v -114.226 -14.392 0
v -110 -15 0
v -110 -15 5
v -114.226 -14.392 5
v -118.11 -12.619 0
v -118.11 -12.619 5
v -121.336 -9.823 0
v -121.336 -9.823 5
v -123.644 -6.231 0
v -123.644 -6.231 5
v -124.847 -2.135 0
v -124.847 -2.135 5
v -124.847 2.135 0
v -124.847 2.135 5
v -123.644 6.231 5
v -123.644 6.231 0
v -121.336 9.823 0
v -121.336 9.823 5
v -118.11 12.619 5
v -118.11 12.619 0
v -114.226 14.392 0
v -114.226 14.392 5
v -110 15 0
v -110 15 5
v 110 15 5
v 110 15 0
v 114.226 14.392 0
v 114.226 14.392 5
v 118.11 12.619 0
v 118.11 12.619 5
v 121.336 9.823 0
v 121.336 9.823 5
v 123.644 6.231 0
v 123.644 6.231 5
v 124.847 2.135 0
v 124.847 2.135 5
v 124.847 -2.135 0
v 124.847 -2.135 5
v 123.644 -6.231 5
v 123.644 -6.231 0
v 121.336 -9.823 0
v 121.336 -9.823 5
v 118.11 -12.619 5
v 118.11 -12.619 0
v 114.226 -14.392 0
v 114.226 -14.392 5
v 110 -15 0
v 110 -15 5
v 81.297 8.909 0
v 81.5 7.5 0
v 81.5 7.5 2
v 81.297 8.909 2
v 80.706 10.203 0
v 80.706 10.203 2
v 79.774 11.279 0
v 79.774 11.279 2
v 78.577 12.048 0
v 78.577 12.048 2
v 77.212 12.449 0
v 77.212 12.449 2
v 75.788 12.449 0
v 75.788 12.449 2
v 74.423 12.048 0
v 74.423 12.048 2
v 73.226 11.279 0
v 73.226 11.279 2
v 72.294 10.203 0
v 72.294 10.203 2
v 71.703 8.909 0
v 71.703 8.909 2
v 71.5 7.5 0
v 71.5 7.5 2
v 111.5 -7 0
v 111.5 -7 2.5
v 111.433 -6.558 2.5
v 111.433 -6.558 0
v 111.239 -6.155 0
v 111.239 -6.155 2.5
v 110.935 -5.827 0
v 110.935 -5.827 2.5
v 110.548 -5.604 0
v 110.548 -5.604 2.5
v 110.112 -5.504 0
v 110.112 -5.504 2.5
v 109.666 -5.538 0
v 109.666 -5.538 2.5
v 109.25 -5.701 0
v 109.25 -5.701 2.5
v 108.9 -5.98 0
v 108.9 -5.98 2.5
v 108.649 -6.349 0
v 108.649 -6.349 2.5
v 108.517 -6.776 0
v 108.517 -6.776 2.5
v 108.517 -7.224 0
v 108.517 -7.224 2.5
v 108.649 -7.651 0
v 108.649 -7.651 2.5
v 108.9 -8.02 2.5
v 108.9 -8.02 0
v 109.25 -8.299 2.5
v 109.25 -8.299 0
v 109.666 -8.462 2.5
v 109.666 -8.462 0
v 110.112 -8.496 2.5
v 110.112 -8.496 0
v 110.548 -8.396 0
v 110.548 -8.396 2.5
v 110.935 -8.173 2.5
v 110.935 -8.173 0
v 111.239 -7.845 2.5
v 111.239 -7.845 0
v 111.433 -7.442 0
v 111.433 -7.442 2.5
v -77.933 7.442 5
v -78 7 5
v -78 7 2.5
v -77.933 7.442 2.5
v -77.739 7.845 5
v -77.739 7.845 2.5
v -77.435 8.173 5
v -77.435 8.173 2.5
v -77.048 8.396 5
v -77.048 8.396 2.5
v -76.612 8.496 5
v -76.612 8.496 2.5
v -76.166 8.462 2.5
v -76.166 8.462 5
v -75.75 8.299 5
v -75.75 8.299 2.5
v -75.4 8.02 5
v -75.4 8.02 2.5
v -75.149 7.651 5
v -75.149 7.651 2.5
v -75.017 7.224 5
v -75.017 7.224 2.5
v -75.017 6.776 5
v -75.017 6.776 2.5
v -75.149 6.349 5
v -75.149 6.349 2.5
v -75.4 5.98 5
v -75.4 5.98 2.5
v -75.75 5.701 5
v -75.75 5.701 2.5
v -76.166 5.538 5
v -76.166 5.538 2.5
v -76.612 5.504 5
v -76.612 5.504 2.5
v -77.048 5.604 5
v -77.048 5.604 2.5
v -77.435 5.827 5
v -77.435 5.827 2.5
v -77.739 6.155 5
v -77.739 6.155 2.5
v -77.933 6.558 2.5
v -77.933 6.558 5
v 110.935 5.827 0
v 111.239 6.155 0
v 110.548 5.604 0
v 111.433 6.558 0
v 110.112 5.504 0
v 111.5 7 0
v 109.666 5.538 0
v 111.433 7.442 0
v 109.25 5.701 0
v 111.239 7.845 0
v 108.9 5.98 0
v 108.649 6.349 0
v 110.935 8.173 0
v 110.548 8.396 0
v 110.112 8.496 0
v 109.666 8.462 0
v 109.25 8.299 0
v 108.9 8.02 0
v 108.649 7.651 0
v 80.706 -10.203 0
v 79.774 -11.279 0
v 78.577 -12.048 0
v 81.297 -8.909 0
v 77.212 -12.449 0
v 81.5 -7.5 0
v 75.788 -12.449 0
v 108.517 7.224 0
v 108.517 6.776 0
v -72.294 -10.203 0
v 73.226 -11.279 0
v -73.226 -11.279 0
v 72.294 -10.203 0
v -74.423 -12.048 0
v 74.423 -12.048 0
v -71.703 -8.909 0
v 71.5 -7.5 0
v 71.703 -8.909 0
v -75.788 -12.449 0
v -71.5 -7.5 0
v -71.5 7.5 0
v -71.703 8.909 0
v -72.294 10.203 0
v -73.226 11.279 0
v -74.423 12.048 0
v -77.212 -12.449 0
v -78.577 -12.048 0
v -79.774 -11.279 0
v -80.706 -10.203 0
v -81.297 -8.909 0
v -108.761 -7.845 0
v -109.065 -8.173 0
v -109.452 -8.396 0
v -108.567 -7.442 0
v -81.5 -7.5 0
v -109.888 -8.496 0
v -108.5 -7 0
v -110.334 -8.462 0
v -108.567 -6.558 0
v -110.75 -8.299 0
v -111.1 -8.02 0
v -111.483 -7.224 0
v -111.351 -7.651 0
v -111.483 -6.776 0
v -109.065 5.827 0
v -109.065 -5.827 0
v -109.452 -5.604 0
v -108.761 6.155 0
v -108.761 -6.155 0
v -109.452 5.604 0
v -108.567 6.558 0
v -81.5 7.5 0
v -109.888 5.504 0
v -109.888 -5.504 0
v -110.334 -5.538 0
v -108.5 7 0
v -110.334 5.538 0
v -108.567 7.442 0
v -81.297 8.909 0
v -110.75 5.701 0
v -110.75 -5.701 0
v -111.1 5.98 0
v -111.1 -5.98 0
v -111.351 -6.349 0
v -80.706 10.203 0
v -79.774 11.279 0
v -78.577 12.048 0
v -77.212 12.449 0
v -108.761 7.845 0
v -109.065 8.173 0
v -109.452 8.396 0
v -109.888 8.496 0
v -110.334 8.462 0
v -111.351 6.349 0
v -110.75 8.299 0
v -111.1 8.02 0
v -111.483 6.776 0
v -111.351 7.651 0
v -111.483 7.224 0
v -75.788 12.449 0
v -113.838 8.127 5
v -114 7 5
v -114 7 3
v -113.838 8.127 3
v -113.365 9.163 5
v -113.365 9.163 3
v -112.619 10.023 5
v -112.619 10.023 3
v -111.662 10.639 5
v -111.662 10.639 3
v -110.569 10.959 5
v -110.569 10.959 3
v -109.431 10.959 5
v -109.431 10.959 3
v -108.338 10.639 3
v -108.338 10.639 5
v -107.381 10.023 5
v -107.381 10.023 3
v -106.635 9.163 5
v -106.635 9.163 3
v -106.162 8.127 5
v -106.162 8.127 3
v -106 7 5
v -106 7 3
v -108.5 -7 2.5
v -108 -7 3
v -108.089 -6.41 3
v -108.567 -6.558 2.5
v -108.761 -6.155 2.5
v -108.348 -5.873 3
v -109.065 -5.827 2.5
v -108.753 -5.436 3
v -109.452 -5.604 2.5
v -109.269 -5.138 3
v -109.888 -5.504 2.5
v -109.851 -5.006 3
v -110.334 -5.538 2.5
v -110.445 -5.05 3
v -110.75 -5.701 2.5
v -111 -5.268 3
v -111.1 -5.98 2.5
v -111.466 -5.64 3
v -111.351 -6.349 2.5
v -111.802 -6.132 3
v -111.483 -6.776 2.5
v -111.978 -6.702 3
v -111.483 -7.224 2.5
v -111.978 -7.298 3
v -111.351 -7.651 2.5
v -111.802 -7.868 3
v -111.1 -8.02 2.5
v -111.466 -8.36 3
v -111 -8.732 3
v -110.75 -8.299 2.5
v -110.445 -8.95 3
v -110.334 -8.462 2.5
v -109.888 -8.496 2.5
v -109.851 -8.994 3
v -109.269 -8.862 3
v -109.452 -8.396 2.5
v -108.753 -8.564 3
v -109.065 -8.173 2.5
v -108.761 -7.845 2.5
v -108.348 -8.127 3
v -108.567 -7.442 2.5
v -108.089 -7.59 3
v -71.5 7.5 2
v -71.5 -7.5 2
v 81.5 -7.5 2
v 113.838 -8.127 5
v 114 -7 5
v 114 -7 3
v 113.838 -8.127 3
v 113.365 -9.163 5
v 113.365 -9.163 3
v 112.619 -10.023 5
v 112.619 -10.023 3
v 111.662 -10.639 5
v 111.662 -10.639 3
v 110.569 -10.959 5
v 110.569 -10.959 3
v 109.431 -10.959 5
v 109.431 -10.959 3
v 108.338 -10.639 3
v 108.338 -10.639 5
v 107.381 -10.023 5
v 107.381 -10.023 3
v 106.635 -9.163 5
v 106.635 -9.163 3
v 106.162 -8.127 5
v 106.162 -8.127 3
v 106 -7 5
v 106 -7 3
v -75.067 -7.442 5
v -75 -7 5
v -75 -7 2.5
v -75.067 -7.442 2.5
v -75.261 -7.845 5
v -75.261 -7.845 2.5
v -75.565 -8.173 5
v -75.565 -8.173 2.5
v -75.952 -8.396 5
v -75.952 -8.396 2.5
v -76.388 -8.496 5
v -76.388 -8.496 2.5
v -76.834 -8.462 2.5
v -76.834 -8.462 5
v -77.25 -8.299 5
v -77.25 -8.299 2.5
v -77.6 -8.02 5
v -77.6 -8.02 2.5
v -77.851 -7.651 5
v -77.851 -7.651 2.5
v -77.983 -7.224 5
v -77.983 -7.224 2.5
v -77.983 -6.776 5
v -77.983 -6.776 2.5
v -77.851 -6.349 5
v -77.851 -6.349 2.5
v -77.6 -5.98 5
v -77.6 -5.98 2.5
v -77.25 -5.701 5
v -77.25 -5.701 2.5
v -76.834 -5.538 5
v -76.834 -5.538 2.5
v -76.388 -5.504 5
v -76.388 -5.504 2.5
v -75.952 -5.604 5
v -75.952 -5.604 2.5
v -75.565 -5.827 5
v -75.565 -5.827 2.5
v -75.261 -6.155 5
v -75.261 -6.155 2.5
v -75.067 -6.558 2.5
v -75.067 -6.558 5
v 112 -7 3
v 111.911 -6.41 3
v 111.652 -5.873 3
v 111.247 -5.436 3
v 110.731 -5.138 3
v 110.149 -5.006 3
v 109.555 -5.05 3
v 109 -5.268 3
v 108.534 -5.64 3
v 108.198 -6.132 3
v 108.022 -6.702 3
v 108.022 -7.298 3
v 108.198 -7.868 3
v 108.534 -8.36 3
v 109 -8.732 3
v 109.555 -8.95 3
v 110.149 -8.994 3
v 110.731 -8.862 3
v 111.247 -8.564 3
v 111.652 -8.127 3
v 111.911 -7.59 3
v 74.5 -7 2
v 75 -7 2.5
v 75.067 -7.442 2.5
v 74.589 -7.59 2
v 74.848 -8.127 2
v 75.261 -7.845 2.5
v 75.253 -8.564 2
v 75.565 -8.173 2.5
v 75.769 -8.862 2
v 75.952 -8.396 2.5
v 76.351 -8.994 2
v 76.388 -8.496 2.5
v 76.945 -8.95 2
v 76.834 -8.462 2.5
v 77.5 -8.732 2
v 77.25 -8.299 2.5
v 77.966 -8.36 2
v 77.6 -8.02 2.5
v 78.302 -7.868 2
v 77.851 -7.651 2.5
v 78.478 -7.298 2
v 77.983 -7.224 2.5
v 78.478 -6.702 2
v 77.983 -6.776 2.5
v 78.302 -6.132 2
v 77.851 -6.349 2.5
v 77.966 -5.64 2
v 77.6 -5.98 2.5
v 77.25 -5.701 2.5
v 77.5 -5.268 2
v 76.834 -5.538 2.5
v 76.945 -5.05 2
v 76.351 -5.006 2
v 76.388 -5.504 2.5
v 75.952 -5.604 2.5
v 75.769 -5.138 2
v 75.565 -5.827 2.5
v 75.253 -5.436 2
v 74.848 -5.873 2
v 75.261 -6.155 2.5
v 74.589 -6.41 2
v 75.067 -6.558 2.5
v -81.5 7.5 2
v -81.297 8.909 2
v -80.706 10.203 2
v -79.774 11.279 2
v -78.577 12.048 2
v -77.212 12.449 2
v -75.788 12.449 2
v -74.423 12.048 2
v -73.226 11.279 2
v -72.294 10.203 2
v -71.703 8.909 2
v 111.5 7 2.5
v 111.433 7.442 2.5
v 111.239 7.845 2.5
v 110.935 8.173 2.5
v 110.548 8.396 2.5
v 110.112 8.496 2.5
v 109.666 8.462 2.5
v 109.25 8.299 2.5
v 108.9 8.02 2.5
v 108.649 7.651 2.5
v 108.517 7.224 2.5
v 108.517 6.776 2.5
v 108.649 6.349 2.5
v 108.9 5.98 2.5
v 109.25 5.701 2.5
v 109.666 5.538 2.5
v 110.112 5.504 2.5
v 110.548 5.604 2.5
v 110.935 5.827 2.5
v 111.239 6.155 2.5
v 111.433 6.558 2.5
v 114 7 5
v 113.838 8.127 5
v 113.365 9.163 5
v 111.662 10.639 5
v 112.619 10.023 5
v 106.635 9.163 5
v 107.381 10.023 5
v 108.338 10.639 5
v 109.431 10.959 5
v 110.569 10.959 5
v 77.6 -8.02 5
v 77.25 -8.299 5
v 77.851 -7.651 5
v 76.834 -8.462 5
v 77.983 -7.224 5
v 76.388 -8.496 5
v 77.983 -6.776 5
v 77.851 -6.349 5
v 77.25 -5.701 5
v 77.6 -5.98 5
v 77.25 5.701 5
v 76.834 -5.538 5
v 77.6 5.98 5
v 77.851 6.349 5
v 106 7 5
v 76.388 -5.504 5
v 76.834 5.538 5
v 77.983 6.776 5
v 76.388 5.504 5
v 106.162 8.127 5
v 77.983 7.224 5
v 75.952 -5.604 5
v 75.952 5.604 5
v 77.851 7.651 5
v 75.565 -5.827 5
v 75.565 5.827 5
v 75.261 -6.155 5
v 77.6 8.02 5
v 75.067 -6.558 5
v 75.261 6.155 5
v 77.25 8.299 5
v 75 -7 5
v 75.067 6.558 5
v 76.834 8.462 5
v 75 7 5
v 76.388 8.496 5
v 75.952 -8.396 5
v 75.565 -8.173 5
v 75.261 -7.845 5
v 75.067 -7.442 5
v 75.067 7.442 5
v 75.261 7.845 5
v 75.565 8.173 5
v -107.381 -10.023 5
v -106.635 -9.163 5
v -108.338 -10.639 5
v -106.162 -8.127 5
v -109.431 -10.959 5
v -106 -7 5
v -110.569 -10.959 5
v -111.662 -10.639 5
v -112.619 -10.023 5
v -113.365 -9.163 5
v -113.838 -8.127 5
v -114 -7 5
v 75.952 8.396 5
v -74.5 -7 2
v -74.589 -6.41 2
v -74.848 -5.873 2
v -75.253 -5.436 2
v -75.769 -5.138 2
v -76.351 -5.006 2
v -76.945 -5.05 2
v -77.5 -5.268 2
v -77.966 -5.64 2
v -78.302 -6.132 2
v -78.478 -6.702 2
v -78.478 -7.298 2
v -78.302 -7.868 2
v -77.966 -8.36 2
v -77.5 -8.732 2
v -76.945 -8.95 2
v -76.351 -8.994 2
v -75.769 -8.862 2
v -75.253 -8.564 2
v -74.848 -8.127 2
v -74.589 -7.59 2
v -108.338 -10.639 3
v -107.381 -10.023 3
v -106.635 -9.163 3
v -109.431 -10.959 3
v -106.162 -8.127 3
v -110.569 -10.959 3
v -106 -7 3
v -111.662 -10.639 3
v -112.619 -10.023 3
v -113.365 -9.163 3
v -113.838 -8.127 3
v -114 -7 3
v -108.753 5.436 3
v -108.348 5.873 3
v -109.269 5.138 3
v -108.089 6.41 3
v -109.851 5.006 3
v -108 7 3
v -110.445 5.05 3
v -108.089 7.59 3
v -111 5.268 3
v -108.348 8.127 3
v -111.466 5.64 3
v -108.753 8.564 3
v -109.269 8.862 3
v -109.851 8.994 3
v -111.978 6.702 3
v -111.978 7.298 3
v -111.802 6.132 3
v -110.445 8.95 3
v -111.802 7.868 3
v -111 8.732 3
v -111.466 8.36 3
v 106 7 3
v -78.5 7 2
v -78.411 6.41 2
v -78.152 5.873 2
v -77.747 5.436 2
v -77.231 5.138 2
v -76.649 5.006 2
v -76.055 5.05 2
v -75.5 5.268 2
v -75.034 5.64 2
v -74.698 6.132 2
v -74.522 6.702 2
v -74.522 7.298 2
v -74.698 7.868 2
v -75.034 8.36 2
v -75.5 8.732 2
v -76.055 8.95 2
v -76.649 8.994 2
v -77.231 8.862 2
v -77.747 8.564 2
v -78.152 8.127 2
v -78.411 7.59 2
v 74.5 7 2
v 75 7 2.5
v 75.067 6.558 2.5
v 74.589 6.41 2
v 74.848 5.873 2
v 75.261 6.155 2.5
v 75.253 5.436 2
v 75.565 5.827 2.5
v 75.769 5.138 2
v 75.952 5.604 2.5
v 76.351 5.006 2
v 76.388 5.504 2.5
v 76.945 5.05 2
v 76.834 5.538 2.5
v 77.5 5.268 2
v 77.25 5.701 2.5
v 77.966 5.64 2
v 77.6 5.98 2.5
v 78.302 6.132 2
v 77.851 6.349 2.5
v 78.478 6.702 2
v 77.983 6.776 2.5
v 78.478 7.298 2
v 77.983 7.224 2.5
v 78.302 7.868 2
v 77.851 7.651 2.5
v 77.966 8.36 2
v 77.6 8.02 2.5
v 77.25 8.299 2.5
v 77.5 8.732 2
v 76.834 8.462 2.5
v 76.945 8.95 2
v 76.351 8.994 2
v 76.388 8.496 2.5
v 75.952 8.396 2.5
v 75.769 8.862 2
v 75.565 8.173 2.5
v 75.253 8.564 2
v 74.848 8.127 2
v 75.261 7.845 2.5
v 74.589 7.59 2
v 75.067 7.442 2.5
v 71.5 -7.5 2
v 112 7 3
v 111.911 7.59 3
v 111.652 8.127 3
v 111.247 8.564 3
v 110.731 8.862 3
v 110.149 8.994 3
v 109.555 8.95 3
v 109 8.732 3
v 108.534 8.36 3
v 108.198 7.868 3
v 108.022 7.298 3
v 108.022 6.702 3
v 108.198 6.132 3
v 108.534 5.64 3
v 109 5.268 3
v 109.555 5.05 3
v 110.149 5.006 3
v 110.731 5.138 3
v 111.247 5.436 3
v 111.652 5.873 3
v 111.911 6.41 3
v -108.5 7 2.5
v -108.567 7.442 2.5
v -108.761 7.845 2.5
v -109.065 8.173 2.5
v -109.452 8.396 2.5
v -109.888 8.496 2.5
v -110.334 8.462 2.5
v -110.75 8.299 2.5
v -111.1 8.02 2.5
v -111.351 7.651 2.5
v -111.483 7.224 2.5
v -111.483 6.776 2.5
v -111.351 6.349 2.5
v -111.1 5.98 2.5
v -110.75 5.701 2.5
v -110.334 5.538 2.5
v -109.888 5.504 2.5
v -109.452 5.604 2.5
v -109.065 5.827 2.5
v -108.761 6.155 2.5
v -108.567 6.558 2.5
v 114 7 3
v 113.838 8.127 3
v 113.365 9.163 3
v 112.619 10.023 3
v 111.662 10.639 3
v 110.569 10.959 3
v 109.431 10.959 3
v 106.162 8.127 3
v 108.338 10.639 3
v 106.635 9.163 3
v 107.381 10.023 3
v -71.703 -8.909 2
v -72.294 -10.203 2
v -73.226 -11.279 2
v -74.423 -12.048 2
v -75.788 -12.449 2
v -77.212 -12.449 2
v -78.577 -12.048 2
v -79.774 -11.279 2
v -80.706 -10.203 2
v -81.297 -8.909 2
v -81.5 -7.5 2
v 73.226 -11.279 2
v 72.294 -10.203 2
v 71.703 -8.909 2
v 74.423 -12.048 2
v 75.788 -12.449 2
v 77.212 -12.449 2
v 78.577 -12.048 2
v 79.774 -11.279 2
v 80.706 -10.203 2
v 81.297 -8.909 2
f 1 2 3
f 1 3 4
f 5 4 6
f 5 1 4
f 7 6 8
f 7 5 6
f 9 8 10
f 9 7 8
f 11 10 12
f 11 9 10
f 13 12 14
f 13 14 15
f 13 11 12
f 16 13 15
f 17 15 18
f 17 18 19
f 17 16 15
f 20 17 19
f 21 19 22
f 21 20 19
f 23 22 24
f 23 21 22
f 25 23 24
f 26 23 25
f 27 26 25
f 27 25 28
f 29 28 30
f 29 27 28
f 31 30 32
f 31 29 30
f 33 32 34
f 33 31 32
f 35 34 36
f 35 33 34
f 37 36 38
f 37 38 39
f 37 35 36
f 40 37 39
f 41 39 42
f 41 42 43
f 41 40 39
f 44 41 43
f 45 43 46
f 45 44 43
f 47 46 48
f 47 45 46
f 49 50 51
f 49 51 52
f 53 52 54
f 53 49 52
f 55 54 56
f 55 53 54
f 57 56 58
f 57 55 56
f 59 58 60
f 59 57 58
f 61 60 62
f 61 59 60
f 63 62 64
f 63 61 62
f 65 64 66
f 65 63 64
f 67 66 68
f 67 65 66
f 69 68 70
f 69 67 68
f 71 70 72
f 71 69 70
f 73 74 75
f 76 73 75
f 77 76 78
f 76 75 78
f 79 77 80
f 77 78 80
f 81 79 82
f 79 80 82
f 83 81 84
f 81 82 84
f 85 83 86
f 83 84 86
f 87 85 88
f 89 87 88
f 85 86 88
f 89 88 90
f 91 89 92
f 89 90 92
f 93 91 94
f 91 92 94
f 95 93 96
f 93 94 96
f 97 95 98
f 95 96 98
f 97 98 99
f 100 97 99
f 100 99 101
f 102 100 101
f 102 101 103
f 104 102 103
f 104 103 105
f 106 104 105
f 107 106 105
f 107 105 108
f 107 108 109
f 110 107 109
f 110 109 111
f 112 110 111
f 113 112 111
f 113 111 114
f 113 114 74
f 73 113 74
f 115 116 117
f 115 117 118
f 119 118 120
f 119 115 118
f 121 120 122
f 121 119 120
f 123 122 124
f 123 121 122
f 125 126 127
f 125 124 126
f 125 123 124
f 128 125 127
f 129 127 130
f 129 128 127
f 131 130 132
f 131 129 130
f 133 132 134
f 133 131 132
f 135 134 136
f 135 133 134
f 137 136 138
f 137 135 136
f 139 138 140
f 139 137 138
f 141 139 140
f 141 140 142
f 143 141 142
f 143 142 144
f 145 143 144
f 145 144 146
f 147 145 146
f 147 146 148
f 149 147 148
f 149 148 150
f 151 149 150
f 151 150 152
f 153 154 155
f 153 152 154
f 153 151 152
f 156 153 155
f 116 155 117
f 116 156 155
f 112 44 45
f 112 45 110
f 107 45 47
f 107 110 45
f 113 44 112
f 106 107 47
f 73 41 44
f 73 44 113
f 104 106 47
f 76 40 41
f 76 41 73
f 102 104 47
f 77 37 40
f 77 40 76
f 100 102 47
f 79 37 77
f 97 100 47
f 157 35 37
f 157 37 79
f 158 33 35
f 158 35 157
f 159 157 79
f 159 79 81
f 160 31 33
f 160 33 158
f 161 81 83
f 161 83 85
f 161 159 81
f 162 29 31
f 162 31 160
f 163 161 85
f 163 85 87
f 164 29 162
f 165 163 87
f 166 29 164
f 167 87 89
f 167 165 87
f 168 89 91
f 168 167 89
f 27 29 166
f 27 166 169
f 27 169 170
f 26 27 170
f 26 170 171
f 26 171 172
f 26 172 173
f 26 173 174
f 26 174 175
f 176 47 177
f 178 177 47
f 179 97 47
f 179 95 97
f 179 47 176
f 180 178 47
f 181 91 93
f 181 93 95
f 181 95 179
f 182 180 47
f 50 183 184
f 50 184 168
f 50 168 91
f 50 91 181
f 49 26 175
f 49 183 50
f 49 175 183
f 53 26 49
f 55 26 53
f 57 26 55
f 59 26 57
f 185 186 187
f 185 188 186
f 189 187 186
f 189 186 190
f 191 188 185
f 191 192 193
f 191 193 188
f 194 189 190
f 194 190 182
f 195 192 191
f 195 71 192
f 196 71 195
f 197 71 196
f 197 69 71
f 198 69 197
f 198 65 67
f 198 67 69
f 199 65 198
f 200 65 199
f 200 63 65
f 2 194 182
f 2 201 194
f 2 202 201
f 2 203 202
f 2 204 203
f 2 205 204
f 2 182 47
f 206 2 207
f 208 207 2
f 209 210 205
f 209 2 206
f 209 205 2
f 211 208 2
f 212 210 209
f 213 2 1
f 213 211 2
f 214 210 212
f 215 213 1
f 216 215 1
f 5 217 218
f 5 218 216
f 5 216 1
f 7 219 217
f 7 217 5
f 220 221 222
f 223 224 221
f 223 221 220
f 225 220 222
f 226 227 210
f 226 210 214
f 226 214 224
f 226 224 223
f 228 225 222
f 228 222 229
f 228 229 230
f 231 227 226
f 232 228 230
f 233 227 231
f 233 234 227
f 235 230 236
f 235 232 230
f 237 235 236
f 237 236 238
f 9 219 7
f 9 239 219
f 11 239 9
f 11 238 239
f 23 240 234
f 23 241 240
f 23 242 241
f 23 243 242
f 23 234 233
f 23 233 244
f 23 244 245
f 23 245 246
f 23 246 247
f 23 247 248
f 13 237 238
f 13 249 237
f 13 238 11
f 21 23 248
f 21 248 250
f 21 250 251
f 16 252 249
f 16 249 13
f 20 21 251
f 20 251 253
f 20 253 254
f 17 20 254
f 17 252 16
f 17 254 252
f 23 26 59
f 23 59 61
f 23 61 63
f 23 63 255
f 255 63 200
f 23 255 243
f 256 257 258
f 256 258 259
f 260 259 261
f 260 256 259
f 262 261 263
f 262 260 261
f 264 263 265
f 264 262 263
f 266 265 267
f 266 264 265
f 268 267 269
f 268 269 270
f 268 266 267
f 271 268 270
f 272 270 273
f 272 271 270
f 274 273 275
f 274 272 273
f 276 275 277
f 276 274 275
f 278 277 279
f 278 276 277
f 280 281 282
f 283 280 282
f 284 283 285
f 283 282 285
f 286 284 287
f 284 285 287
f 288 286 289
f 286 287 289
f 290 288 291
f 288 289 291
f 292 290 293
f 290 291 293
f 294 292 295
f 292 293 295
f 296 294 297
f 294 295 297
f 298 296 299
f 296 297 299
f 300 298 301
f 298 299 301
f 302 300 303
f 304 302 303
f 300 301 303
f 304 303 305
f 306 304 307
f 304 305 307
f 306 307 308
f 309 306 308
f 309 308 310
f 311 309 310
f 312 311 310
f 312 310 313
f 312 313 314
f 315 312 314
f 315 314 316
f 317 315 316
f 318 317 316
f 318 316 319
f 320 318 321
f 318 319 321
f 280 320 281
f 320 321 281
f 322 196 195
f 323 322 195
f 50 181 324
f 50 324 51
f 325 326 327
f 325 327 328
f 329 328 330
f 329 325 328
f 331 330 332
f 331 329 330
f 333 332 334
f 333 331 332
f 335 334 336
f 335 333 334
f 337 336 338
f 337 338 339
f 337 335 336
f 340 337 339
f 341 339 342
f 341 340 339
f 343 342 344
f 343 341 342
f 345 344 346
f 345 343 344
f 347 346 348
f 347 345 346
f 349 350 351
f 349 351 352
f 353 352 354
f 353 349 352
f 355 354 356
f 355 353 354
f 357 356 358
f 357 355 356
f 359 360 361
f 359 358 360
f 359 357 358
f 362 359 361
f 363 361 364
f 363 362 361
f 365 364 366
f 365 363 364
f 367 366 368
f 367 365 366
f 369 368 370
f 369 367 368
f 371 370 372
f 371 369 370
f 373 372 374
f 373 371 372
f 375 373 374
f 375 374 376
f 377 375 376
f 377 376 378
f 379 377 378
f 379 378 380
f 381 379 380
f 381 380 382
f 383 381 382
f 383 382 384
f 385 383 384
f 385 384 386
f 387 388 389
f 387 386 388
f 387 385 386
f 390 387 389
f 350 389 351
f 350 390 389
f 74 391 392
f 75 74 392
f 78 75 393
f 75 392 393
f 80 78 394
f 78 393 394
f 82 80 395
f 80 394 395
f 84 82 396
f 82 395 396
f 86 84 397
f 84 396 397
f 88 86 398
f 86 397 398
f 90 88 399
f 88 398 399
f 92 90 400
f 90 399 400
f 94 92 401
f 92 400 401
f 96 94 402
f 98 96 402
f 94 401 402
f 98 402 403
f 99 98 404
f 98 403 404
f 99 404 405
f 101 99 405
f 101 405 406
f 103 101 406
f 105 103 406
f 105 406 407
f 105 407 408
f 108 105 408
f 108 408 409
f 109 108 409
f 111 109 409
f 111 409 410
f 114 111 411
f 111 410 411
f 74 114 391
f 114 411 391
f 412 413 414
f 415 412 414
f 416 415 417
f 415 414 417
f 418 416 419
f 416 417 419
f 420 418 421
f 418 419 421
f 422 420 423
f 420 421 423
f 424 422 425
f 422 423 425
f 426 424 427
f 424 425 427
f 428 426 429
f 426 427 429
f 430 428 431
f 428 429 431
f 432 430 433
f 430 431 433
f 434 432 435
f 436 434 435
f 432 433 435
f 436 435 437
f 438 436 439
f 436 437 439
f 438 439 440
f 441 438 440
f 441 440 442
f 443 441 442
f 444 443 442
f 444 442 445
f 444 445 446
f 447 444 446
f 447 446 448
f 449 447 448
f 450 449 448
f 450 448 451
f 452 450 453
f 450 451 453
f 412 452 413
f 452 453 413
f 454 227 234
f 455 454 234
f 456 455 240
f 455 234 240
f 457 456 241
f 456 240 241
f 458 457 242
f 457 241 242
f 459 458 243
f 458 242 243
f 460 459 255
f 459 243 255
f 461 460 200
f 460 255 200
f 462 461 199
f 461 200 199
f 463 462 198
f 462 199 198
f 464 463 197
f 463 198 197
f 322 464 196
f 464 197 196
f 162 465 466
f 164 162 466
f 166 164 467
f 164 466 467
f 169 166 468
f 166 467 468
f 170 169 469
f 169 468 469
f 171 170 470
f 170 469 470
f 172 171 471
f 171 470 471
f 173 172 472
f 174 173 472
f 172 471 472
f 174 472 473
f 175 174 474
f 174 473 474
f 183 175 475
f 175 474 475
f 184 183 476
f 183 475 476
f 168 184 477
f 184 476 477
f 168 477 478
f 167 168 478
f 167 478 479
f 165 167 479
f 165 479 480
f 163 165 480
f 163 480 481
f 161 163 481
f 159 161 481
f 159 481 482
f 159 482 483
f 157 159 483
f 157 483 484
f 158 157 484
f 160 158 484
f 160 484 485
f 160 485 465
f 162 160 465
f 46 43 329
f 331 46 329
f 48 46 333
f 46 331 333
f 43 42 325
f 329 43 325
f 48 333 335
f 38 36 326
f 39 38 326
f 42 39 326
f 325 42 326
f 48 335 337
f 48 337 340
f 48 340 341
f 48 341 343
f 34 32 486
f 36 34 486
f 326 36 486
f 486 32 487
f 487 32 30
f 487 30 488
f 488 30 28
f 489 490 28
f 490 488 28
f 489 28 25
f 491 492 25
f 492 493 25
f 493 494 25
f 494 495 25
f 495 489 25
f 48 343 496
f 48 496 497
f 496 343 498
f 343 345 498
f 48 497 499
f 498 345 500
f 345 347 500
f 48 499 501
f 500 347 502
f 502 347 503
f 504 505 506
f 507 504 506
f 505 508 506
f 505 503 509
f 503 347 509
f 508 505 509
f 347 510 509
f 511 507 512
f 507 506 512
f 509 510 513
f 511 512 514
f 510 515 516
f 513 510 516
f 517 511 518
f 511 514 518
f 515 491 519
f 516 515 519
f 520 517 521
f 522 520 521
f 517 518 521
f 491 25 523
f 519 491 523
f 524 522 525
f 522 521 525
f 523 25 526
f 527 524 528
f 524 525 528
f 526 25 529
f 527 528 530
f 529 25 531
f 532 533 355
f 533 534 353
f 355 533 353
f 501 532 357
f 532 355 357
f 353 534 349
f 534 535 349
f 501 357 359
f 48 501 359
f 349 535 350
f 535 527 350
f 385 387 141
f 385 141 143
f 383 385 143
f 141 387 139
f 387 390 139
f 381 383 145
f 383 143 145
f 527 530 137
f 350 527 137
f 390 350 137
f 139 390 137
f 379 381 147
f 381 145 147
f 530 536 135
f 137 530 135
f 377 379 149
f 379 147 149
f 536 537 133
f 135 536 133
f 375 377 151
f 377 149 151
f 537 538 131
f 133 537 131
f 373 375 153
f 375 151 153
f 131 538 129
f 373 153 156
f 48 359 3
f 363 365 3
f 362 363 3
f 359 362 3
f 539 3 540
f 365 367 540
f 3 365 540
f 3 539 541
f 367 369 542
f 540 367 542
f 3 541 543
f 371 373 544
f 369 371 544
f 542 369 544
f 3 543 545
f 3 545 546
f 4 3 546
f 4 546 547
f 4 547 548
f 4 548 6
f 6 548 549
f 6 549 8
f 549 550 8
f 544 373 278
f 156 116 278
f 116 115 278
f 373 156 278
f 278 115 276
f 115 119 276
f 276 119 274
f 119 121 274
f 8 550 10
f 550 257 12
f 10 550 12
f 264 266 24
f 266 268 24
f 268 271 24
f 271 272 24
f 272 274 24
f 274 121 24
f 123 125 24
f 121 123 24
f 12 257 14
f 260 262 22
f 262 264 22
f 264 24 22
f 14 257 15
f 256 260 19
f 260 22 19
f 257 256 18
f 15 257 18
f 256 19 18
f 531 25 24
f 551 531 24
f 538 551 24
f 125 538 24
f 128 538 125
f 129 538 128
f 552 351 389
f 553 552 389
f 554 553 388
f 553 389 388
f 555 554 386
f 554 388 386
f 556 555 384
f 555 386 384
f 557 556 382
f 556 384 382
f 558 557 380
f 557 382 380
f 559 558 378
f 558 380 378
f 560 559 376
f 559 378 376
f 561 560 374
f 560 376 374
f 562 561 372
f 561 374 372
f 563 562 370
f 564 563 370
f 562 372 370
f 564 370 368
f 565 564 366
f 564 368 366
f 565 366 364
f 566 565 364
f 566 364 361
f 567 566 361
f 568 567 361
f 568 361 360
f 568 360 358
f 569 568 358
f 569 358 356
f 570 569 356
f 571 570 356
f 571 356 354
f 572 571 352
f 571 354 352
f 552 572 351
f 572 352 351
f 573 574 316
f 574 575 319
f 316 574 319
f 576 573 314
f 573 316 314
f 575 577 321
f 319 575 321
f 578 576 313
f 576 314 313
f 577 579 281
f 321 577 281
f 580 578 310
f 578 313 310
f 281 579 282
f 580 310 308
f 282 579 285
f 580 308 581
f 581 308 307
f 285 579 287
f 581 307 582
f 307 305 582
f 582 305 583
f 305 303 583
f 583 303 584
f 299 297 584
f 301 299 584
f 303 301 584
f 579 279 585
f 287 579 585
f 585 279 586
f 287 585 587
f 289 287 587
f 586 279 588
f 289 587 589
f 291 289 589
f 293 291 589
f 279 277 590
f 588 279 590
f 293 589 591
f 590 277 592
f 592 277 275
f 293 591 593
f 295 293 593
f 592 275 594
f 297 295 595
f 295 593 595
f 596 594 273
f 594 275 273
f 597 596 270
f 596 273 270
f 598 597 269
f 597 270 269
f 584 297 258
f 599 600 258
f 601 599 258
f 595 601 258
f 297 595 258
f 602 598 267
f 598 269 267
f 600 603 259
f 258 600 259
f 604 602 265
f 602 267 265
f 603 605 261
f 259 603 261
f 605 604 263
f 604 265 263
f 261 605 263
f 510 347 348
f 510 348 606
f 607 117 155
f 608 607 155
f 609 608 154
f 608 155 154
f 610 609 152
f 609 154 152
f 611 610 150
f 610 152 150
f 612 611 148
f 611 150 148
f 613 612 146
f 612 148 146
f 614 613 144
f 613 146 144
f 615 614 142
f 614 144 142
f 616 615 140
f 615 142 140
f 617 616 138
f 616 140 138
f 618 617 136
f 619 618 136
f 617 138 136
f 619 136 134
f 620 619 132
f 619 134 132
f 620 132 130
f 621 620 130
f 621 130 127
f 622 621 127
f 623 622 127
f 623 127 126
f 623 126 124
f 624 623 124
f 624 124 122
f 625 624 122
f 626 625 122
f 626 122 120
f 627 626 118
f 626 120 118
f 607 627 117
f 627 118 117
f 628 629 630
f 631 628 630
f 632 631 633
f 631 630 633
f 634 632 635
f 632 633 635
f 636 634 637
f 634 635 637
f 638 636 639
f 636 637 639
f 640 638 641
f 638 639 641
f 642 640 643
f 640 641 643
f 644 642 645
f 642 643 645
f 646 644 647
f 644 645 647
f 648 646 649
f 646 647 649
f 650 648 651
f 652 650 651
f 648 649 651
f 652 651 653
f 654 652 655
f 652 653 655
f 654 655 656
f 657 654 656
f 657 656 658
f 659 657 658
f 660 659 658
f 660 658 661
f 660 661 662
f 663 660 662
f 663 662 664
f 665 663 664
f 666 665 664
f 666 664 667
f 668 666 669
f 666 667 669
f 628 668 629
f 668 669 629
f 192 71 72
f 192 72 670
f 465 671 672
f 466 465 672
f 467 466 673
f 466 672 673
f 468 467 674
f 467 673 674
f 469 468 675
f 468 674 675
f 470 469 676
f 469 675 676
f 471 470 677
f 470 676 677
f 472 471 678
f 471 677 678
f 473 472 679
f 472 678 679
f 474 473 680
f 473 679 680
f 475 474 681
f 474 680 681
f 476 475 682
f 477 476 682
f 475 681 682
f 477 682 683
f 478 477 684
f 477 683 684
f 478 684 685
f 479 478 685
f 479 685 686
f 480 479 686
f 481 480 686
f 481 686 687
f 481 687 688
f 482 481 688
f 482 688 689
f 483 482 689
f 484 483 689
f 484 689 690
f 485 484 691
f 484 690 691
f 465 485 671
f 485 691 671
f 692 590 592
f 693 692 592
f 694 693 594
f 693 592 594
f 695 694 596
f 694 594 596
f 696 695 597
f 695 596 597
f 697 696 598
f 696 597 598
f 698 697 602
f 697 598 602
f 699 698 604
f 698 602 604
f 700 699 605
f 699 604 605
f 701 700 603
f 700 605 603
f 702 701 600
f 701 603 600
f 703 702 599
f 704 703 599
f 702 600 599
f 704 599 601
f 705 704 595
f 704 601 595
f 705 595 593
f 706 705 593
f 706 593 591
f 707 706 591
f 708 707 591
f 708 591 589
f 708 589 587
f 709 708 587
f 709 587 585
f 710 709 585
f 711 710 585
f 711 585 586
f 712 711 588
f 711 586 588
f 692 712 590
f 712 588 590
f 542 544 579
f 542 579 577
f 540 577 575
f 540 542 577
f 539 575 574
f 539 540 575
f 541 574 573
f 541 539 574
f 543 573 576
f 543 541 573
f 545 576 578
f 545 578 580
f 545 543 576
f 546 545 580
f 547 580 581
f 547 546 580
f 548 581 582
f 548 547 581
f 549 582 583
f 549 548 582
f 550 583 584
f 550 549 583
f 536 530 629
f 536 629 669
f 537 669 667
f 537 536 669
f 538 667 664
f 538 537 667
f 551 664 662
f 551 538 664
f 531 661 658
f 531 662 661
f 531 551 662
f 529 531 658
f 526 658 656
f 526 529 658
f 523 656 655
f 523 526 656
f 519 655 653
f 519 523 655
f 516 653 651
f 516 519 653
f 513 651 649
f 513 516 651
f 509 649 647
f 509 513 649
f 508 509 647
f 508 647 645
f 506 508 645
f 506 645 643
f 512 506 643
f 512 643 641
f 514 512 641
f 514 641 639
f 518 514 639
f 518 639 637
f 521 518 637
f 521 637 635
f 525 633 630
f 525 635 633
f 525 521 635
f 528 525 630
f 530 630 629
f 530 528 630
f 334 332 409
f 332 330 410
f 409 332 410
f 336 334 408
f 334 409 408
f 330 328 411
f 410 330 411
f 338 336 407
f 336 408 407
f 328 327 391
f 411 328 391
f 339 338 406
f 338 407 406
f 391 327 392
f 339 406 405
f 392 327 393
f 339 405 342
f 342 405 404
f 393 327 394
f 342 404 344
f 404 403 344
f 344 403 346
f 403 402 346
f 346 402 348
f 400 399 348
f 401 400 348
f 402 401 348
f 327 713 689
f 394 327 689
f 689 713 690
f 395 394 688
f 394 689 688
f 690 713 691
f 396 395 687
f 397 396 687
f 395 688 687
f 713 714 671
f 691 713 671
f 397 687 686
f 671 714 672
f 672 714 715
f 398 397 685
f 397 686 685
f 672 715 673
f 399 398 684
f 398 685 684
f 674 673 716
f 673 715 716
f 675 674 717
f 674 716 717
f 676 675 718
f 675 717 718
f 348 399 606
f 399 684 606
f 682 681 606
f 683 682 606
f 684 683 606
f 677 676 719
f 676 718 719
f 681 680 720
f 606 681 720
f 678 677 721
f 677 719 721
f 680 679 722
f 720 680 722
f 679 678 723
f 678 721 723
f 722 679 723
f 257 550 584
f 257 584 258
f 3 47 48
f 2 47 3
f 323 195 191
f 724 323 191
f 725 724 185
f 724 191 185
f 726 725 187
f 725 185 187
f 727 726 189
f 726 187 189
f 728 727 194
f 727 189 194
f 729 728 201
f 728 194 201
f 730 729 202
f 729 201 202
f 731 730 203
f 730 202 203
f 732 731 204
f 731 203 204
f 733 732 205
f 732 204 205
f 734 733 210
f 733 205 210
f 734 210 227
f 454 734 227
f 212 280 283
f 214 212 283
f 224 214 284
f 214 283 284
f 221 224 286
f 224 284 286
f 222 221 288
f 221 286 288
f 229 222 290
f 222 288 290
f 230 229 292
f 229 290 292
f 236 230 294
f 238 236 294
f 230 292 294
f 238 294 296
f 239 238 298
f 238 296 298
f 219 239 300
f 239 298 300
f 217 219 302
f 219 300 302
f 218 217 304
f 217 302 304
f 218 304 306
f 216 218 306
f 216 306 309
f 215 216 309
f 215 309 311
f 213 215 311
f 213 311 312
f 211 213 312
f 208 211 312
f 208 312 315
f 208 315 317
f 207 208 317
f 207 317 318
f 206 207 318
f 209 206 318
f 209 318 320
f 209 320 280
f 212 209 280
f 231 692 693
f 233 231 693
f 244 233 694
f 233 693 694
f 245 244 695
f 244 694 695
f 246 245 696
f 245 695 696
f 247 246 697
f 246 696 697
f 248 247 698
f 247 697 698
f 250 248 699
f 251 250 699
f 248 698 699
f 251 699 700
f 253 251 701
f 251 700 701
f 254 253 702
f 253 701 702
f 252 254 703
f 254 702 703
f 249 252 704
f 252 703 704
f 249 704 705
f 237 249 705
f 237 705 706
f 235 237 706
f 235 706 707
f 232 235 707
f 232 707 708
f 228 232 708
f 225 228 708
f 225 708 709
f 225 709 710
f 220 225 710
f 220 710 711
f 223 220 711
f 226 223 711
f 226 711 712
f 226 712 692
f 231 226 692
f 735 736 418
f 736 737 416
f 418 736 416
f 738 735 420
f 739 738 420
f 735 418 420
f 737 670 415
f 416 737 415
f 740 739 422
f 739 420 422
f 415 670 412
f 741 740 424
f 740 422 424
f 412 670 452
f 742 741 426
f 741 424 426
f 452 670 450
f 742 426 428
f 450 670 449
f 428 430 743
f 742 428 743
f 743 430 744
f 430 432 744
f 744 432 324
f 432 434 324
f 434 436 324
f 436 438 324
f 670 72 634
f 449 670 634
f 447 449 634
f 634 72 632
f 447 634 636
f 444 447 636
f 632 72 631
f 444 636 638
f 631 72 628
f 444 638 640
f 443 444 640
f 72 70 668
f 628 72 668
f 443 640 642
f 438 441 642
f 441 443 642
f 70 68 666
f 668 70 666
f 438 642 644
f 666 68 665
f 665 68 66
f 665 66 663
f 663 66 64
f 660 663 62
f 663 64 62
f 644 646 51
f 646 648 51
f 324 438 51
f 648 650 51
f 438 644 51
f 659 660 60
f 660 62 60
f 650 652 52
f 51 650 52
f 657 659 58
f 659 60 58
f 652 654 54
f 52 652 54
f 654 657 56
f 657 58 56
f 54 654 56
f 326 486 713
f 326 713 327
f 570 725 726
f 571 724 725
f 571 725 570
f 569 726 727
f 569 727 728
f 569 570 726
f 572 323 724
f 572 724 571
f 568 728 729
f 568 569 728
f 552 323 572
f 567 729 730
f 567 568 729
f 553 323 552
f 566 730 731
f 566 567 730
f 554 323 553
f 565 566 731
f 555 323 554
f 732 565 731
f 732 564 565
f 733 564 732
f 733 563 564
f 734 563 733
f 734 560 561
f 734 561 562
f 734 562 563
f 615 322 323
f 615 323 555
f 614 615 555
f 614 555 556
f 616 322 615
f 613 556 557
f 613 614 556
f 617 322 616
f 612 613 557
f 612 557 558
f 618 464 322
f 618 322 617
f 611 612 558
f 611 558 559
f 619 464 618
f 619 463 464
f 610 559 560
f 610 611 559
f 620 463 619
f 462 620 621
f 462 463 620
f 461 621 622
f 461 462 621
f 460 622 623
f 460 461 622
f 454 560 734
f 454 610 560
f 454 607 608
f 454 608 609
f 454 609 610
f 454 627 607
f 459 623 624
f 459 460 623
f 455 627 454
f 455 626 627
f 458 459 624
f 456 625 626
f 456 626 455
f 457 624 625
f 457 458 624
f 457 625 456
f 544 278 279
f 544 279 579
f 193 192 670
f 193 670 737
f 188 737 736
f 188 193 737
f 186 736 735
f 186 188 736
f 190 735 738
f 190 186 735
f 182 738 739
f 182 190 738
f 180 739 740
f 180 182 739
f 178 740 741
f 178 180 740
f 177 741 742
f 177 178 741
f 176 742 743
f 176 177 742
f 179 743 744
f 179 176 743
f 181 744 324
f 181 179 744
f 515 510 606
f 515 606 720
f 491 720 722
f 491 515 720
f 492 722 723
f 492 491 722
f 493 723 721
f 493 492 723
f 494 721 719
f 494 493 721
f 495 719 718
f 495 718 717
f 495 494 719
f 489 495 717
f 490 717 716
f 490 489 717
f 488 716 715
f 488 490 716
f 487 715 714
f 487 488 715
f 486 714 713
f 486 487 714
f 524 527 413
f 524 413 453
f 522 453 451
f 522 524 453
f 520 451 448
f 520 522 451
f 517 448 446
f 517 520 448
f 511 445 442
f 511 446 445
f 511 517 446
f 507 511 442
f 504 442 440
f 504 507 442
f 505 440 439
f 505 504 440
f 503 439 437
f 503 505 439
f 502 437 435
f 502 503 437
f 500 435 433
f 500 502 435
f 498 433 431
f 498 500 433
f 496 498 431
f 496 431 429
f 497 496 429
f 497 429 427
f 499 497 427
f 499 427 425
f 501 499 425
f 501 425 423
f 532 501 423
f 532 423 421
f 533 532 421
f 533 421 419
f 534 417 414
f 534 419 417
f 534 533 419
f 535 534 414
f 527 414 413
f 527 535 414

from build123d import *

# Parameters (mm, degrees)
EXTRUDE_1_DEPTH          = 5
CUT_EXTRUDE_1_DEPTH      = 2
CUT_EXTRUDE_2_DEPTH      = 2
CUT_EXTRUDE_4_DEPTH      = 126.932521614
CUT_EXTRUDE_4_DEPTH_BACK = 126.932521614
SKETCH_6_R               = 1.5
SKETCH_7_R               = 1.5
CUT_EXTRUDE_5_DEPTH      = 126.932521614
CHAMFER_1_SIZE           = 0.5
CHAMFER_2_SIZE           = 0.5


with BuildPart() as part:
    # 草图1 → 凸台-拉伸1 (new body)
    with BuildSketch(Plane.XY):
        with BuildLine():
            Line((-110, 15), (110, 15))
            ThreePointArc((110, 15), (125, 0), (110, -15))
            Line((110, -15), (-110, -15))
            ThreePointArc((-110, -15), (-125, 0), (-110, 15))
        make_face()
    extrude(amount=EXTRUDE_1_DEPTH)

    # 草图2 → 切除-拉伸1 (cut)
    with BuildSketch(Plane.XY.offset(5)):
        with BuildLine():
            Line((114, 7), (114, -7))
            ThreePointArc((114, -7), (110, -11), (106, -7))
            Line((106, -7), (106, 7))
            ThreePointArc((106, 7), (110, 11), (114, 7))
        make_face()
        with BuildLine():
            Line((-106, 7), (-106, -7))
            ThreePointArc((-106, -7), (-110, -11), (-114, -7))
            Line((-114, -7), (-114, 7))
            ThreePointArc((-114, 7), (-110, 11), (-106, 7))
        make_face()
    extrude(amount=-CUT_EXTRUDE_1_DEPTH, mode=Mode.SUBTRACT)

    # 草图4 → 切除-拉伸2 (cut)
    with BuildSketch(Plane(origin=(0, 0, 0), x_dir=(-1, 0, 0), z_dir=(0, 0, -1))):
        with BuildLine():
            Line((-71.5, 7.5), (-71.5, -7.5))
            ThreePointArc((-71.5, -7.5), (-76.5, -12.5), (-81.5, -7.5))
            Line((-81.5, -7.5), (-81.5, 7.5))
            ThreePointArc((-81.5, 7.5), (-76.5, 12.5), (-71.5, 7.5))
        make_face()
        with BuildLine():
            Line((71.5, 7.5), (71.5, -7.5))
            ThreePointArc((71.5, -7.5), (76.5, -12.5), (81.5, -7.5))
            Line((81.5, -7.5), (81.5, 7.5))
            ThreePointArc((81.5, 7.5), (76.5, 12.5), (71.5, 7.5))
        make_face()
    extrude(amount=-CUT_EXTRUDE_2_DEPTH, mode=Mode.SUBTRACT)

    # 草图6 → 切除-拉伸4 (cut, two sides: drawn at the far end of the back side and taken through both)
    with BuildSketch(Plane(origin=(0, 0, 2), x_dir=(-1, 0, 0), z_dir=(0, 0, -1)).offset(-CUT_EXTRUDE_4_DEPTH_BACK)):
        with Locations((76.5, 7)):
            Circle(SKETCH_6_R)
        with Locations(Location((76.5, -7, 0), (0, 0, 180))):
            Circle(SKETCH_6_R)
        with Locations((-76.5, 7)):
            Circle(SKETCH_6_R)
        with Locations((-76.5, -7)):
            Circle(SKETCH_6_R)
    extrude(amount=CUT_EXTRUDE_4_DEPTH + CUT_EXTRUDE_4_DEPTH_BACK, mode=Mode.SUBTRACT)

    # 草图7 → 切除-拉伸5 (cut, through all)
    with BuildSketch(Plane.XY.offset(3)):
        with Locations((110, 7)):
            Circle(SKETCH_7_R)
        with Locations((110, -7)):
            Circle(SKETCH_7_R)
        with Locations((-110, 7)):
            Circle(SKETCH_7_R)
        with Locations((-110, -7)):
            Circle(SKETCH_7_R)
    extrude(amount=-CUT_EXTRUDE_5_DEPTH, mode=Mode.SUBTRACT)

    # 倒角1
    chamfer_1_edges = [part.edges().sort_by_distance(p)[0] for p in [
        (108.5, -7, 3),
        (-111.5, 7, 3),
        (-111.5, -7, 3),
        (108.5, 7, 3),
    ]]
    chamfer(chamfer_1_edges, length=CHAMFER_1_SIZE)

    # 倒角2
    chamfer_2_edges = [part.edges().sort_by_distance(p)[0] for p in [
        (-78, -7, 2),
        (78, 7, 2),
        (78, -7, 2),
        (-75, 7, 2),
    ]]
    chamfer(chamfer_2_edges, length=CHAMFER_2_SIZE)


solid = part.part
